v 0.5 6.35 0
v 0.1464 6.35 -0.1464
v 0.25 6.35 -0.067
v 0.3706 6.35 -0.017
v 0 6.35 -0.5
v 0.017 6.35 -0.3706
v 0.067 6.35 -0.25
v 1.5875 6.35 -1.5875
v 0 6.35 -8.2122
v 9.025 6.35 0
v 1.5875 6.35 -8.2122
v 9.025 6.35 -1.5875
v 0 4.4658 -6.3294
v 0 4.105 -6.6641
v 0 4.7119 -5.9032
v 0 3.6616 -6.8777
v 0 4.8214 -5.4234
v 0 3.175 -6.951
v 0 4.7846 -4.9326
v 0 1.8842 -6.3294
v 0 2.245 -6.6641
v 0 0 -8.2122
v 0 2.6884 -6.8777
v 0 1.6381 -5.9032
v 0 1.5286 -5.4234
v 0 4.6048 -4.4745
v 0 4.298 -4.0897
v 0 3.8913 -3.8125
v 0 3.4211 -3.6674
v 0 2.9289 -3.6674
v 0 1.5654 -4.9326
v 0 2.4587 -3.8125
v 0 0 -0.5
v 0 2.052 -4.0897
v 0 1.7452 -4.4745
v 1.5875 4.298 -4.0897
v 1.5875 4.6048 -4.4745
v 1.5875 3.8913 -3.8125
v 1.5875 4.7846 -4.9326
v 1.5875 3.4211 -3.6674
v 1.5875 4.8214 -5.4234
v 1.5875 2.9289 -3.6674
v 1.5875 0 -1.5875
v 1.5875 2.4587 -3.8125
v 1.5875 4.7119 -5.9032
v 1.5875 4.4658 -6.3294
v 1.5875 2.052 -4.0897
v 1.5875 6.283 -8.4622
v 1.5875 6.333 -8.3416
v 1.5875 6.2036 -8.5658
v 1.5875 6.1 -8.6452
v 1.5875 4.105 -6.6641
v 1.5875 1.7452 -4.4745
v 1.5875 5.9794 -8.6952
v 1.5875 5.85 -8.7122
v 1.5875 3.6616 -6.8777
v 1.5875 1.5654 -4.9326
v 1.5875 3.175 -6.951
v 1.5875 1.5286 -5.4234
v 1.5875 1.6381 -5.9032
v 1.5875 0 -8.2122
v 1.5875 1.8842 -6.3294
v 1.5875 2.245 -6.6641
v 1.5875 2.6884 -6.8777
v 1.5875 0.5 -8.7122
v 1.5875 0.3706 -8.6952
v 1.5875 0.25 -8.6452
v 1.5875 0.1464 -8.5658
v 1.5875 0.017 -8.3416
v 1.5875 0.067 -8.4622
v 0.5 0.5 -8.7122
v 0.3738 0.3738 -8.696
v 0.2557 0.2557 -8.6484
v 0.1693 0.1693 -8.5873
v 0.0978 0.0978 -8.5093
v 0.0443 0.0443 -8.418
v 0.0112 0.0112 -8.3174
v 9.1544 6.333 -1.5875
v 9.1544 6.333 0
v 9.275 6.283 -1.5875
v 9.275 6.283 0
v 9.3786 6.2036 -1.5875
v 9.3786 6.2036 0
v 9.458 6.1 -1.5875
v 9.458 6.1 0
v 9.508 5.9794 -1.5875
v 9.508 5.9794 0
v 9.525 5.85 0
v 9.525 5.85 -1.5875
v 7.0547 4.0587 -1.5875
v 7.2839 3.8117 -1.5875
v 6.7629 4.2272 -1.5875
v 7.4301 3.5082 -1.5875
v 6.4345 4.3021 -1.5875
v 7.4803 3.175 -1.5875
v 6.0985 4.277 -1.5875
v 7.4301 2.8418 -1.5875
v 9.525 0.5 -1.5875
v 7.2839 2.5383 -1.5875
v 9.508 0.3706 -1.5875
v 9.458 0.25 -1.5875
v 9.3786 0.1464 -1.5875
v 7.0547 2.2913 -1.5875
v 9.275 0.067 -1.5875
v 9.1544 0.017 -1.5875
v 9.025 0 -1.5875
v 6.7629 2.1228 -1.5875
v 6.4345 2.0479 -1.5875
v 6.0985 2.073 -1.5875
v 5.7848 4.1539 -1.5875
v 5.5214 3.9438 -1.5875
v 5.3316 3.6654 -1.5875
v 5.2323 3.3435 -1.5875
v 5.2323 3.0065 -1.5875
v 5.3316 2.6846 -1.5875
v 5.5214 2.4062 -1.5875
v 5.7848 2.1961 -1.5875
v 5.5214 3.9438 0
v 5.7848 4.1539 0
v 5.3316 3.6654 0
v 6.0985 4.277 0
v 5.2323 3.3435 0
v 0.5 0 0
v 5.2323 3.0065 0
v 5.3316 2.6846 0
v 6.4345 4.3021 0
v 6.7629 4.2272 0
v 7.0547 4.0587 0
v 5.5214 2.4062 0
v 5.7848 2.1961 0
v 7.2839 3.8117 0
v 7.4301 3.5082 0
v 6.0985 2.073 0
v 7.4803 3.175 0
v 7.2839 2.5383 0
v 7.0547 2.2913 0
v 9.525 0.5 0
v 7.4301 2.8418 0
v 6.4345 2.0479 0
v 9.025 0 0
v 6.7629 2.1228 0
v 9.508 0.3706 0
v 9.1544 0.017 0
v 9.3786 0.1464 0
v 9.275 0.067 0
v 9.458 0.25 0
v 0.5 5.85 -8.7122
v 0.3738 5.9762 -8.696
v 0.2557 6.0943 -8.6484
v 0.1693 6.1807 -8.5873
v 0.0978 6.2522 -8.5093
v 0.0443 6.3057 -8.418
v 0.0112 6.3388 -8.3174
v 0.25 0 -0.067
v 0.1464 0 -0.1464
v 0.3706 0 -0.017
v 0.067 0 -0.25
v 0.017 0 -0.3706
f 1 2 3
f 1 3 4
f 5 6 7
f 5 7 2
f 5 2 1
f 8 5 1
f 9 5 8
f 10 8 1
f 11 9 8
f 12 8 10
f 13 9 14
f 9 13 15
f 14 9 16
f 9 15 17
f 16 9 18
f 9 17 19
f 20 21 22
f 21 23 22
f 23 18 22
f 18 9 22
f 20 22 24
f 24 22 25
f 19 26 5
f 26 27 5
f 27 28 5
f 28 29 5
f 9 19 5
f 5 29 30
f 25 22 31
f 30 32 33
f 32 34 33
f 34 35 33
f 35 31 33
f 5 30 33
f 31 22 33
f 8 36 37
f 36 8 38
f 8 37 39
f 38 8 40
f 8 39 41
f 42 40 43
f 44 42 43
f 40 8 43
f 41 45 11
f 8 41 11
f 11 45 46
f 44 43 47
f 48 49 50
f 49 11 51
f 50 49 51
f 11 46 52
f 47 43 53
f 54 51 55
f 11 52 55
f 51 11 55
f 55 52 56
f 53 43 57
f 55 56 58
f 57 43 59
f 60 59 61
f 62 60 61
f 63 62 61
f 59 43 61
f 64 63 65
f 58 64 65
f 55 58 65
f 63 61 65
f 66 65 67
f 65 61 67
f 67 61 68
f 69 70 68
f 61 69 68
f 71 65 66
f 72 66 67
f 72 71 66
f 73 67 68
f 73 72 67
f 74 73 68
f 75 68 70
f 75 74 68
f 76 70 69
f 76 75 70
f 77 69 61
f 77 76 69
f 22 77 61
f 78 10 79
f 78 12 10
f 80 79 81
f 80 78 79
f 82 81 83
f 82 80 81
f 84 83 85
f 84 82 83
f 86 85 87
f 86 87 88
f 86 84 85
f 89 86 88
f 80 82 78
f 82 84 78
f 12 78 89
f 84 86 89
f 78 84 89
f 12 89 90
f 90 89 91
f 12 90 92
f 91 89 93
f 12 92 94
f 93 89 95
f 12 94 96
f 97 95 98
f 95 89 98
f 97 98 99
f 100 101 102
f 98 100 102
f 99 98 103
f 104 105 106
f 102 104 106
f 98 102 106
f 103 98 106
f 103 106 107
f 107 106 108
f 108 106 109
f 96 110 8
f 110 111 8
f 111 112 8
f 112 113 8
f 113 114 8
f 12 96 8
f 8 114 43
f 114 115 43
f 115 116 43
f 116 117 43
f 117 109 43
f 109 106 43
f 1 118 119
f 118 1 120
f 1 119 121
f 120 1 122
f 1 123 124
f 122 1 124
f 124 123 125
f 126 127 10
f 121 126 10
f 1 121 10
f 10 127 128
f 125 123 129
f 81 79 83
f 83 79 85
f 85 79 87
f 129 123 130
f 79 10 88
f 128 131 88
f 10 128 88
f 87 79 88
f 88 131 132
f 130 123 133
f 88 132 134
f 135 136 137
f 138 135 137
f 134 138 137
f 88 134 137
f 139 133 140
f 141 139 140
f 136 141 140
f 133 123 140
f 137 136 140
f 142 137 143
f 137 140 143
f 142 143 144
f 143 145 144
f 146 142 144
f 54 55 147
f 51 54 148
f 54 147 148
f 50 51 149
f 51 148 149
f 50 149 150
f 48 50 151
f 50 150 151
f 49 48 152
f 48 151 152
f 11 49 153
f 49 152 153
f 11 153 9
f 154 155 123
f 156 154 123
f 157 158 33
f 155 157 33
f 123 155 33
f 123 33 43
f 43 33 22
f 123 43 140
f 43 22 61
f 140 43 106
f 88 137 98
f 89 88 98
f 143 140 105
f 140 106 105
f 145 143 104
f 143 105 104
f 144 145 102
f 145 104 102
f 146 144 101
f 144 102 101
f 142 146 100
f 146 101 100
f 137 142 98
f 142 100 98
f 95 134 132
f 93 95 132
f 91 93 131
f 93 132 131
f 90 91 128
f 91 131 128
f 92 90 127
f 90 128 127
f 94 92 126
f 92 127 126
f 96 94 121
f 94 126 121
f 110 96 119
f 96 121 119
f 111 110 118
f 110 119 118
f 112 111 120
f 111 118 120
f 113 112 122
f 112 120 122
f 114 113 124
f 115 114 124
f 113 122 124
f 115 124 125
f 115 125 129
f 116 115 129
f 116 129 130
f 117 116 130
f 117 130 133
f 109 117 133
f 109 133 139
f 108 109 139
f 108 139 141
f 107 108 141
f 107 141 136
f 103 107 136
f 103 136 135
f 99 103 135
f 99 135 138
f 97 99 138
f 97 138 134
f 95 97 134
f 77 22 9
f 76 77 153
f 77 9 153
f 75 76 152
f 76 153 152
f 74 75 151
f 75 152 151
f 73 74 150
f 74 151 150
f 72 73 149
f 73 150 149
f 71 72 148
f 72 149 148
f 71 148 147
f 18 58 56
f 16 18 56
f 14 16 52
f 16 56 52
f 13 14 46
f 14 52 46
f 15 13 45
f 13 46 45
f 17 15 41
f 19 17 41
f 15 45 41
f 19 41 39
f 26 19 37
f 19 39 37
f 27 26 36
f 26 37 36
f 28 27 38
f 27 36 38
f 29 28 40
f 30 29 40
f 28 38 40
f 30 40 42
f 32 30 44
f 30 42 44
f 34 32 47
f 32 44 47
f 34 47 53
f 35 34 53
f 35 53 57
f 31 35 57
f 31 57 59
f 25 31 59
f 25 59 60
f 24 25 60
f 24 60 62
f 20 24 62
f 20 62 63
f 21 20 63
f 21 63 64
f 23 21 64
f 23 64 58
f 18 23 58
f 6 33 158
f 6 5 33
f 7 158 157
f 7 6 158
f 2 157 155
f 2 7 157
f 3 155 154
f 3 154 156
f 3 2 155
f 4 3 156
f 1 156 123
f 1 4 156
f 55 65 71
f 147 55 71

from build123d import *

# Parameters (mm, degrees)
BOSS_EXTRUDE1_DEPTH   = 6.35
CUT_EXTRUDE1_REACH    = 15.388
SKETCH2_R             = 1.651
F_4_40_TAPPED_HOLE2_D = 2.2606
FILLET1_R             = 0.5


with BuildPart() as part:
    # Sketch1 → Boss-Extrude1 (new body)
    with BuildSketch(Plane(origin=(0, 0, 0), x_dir=(1, 0, 0), z_dir=(0, 1, 0))):
        Polygon((0, 8.7122), (0, 0), (9.525, 0), (9.525, 1.5875), (1.5875, 1.5875), (1.5875, 8.7122), align=None)
    extrude(amount=BOSS_EXTRUDE1_DEPTH)

    # Sketch2 → Cut-Extrude1 (cut, up to next)
    with BuildSketch(Plane(origin=(1.5875, 0, 0), x_dir=(0, 0, -1), z_dir=(1, 0, 0)), mode=Mode.PRIVATE) as cut_extrude1_sk1:
        with Locations((5.3, 3.175)):
            Circle(SKETCH2_R)
    cut_extrude1_tool1 = extrude(cut_extrude1_sk1.sketch, amount=-CUT_EXTRUDE1_REACH, mode=Mode.PRIVATE) & part.part
    add(cut_extrude1_tool1.solids().sort_by_distance((1.5875, 3.175, -5.3))[0], mode=Mode.SUBTRACT)

    # #4-40 Tapped Hole2 (through all)
    with Locations(Plane(origin=(6.35, 3.175, -1.5875), x_dir=(-1, 0, 0), z_dir=(0, 0, -1))):
        with Locations((0, 0)):
            Hole(F_4_40_TAPPED_HOLE2_D / 2)

    # Fillet1
    fillet1_edges = [part.edges().sort_by_distance(p)[0] for p in [
        (0, 3.175, 0),
        (0, 3.175, -8.7122),
        (9.525, 6.35, -0.79375),
        (9.525, 0, -0.79375),
        (0.79375, 6.35, -8.7122),
        (0.79375, 0, -8.7122),
    ]]
    fillet(fillet1_edges, radius=FILLET1_R)


solid = part.part
